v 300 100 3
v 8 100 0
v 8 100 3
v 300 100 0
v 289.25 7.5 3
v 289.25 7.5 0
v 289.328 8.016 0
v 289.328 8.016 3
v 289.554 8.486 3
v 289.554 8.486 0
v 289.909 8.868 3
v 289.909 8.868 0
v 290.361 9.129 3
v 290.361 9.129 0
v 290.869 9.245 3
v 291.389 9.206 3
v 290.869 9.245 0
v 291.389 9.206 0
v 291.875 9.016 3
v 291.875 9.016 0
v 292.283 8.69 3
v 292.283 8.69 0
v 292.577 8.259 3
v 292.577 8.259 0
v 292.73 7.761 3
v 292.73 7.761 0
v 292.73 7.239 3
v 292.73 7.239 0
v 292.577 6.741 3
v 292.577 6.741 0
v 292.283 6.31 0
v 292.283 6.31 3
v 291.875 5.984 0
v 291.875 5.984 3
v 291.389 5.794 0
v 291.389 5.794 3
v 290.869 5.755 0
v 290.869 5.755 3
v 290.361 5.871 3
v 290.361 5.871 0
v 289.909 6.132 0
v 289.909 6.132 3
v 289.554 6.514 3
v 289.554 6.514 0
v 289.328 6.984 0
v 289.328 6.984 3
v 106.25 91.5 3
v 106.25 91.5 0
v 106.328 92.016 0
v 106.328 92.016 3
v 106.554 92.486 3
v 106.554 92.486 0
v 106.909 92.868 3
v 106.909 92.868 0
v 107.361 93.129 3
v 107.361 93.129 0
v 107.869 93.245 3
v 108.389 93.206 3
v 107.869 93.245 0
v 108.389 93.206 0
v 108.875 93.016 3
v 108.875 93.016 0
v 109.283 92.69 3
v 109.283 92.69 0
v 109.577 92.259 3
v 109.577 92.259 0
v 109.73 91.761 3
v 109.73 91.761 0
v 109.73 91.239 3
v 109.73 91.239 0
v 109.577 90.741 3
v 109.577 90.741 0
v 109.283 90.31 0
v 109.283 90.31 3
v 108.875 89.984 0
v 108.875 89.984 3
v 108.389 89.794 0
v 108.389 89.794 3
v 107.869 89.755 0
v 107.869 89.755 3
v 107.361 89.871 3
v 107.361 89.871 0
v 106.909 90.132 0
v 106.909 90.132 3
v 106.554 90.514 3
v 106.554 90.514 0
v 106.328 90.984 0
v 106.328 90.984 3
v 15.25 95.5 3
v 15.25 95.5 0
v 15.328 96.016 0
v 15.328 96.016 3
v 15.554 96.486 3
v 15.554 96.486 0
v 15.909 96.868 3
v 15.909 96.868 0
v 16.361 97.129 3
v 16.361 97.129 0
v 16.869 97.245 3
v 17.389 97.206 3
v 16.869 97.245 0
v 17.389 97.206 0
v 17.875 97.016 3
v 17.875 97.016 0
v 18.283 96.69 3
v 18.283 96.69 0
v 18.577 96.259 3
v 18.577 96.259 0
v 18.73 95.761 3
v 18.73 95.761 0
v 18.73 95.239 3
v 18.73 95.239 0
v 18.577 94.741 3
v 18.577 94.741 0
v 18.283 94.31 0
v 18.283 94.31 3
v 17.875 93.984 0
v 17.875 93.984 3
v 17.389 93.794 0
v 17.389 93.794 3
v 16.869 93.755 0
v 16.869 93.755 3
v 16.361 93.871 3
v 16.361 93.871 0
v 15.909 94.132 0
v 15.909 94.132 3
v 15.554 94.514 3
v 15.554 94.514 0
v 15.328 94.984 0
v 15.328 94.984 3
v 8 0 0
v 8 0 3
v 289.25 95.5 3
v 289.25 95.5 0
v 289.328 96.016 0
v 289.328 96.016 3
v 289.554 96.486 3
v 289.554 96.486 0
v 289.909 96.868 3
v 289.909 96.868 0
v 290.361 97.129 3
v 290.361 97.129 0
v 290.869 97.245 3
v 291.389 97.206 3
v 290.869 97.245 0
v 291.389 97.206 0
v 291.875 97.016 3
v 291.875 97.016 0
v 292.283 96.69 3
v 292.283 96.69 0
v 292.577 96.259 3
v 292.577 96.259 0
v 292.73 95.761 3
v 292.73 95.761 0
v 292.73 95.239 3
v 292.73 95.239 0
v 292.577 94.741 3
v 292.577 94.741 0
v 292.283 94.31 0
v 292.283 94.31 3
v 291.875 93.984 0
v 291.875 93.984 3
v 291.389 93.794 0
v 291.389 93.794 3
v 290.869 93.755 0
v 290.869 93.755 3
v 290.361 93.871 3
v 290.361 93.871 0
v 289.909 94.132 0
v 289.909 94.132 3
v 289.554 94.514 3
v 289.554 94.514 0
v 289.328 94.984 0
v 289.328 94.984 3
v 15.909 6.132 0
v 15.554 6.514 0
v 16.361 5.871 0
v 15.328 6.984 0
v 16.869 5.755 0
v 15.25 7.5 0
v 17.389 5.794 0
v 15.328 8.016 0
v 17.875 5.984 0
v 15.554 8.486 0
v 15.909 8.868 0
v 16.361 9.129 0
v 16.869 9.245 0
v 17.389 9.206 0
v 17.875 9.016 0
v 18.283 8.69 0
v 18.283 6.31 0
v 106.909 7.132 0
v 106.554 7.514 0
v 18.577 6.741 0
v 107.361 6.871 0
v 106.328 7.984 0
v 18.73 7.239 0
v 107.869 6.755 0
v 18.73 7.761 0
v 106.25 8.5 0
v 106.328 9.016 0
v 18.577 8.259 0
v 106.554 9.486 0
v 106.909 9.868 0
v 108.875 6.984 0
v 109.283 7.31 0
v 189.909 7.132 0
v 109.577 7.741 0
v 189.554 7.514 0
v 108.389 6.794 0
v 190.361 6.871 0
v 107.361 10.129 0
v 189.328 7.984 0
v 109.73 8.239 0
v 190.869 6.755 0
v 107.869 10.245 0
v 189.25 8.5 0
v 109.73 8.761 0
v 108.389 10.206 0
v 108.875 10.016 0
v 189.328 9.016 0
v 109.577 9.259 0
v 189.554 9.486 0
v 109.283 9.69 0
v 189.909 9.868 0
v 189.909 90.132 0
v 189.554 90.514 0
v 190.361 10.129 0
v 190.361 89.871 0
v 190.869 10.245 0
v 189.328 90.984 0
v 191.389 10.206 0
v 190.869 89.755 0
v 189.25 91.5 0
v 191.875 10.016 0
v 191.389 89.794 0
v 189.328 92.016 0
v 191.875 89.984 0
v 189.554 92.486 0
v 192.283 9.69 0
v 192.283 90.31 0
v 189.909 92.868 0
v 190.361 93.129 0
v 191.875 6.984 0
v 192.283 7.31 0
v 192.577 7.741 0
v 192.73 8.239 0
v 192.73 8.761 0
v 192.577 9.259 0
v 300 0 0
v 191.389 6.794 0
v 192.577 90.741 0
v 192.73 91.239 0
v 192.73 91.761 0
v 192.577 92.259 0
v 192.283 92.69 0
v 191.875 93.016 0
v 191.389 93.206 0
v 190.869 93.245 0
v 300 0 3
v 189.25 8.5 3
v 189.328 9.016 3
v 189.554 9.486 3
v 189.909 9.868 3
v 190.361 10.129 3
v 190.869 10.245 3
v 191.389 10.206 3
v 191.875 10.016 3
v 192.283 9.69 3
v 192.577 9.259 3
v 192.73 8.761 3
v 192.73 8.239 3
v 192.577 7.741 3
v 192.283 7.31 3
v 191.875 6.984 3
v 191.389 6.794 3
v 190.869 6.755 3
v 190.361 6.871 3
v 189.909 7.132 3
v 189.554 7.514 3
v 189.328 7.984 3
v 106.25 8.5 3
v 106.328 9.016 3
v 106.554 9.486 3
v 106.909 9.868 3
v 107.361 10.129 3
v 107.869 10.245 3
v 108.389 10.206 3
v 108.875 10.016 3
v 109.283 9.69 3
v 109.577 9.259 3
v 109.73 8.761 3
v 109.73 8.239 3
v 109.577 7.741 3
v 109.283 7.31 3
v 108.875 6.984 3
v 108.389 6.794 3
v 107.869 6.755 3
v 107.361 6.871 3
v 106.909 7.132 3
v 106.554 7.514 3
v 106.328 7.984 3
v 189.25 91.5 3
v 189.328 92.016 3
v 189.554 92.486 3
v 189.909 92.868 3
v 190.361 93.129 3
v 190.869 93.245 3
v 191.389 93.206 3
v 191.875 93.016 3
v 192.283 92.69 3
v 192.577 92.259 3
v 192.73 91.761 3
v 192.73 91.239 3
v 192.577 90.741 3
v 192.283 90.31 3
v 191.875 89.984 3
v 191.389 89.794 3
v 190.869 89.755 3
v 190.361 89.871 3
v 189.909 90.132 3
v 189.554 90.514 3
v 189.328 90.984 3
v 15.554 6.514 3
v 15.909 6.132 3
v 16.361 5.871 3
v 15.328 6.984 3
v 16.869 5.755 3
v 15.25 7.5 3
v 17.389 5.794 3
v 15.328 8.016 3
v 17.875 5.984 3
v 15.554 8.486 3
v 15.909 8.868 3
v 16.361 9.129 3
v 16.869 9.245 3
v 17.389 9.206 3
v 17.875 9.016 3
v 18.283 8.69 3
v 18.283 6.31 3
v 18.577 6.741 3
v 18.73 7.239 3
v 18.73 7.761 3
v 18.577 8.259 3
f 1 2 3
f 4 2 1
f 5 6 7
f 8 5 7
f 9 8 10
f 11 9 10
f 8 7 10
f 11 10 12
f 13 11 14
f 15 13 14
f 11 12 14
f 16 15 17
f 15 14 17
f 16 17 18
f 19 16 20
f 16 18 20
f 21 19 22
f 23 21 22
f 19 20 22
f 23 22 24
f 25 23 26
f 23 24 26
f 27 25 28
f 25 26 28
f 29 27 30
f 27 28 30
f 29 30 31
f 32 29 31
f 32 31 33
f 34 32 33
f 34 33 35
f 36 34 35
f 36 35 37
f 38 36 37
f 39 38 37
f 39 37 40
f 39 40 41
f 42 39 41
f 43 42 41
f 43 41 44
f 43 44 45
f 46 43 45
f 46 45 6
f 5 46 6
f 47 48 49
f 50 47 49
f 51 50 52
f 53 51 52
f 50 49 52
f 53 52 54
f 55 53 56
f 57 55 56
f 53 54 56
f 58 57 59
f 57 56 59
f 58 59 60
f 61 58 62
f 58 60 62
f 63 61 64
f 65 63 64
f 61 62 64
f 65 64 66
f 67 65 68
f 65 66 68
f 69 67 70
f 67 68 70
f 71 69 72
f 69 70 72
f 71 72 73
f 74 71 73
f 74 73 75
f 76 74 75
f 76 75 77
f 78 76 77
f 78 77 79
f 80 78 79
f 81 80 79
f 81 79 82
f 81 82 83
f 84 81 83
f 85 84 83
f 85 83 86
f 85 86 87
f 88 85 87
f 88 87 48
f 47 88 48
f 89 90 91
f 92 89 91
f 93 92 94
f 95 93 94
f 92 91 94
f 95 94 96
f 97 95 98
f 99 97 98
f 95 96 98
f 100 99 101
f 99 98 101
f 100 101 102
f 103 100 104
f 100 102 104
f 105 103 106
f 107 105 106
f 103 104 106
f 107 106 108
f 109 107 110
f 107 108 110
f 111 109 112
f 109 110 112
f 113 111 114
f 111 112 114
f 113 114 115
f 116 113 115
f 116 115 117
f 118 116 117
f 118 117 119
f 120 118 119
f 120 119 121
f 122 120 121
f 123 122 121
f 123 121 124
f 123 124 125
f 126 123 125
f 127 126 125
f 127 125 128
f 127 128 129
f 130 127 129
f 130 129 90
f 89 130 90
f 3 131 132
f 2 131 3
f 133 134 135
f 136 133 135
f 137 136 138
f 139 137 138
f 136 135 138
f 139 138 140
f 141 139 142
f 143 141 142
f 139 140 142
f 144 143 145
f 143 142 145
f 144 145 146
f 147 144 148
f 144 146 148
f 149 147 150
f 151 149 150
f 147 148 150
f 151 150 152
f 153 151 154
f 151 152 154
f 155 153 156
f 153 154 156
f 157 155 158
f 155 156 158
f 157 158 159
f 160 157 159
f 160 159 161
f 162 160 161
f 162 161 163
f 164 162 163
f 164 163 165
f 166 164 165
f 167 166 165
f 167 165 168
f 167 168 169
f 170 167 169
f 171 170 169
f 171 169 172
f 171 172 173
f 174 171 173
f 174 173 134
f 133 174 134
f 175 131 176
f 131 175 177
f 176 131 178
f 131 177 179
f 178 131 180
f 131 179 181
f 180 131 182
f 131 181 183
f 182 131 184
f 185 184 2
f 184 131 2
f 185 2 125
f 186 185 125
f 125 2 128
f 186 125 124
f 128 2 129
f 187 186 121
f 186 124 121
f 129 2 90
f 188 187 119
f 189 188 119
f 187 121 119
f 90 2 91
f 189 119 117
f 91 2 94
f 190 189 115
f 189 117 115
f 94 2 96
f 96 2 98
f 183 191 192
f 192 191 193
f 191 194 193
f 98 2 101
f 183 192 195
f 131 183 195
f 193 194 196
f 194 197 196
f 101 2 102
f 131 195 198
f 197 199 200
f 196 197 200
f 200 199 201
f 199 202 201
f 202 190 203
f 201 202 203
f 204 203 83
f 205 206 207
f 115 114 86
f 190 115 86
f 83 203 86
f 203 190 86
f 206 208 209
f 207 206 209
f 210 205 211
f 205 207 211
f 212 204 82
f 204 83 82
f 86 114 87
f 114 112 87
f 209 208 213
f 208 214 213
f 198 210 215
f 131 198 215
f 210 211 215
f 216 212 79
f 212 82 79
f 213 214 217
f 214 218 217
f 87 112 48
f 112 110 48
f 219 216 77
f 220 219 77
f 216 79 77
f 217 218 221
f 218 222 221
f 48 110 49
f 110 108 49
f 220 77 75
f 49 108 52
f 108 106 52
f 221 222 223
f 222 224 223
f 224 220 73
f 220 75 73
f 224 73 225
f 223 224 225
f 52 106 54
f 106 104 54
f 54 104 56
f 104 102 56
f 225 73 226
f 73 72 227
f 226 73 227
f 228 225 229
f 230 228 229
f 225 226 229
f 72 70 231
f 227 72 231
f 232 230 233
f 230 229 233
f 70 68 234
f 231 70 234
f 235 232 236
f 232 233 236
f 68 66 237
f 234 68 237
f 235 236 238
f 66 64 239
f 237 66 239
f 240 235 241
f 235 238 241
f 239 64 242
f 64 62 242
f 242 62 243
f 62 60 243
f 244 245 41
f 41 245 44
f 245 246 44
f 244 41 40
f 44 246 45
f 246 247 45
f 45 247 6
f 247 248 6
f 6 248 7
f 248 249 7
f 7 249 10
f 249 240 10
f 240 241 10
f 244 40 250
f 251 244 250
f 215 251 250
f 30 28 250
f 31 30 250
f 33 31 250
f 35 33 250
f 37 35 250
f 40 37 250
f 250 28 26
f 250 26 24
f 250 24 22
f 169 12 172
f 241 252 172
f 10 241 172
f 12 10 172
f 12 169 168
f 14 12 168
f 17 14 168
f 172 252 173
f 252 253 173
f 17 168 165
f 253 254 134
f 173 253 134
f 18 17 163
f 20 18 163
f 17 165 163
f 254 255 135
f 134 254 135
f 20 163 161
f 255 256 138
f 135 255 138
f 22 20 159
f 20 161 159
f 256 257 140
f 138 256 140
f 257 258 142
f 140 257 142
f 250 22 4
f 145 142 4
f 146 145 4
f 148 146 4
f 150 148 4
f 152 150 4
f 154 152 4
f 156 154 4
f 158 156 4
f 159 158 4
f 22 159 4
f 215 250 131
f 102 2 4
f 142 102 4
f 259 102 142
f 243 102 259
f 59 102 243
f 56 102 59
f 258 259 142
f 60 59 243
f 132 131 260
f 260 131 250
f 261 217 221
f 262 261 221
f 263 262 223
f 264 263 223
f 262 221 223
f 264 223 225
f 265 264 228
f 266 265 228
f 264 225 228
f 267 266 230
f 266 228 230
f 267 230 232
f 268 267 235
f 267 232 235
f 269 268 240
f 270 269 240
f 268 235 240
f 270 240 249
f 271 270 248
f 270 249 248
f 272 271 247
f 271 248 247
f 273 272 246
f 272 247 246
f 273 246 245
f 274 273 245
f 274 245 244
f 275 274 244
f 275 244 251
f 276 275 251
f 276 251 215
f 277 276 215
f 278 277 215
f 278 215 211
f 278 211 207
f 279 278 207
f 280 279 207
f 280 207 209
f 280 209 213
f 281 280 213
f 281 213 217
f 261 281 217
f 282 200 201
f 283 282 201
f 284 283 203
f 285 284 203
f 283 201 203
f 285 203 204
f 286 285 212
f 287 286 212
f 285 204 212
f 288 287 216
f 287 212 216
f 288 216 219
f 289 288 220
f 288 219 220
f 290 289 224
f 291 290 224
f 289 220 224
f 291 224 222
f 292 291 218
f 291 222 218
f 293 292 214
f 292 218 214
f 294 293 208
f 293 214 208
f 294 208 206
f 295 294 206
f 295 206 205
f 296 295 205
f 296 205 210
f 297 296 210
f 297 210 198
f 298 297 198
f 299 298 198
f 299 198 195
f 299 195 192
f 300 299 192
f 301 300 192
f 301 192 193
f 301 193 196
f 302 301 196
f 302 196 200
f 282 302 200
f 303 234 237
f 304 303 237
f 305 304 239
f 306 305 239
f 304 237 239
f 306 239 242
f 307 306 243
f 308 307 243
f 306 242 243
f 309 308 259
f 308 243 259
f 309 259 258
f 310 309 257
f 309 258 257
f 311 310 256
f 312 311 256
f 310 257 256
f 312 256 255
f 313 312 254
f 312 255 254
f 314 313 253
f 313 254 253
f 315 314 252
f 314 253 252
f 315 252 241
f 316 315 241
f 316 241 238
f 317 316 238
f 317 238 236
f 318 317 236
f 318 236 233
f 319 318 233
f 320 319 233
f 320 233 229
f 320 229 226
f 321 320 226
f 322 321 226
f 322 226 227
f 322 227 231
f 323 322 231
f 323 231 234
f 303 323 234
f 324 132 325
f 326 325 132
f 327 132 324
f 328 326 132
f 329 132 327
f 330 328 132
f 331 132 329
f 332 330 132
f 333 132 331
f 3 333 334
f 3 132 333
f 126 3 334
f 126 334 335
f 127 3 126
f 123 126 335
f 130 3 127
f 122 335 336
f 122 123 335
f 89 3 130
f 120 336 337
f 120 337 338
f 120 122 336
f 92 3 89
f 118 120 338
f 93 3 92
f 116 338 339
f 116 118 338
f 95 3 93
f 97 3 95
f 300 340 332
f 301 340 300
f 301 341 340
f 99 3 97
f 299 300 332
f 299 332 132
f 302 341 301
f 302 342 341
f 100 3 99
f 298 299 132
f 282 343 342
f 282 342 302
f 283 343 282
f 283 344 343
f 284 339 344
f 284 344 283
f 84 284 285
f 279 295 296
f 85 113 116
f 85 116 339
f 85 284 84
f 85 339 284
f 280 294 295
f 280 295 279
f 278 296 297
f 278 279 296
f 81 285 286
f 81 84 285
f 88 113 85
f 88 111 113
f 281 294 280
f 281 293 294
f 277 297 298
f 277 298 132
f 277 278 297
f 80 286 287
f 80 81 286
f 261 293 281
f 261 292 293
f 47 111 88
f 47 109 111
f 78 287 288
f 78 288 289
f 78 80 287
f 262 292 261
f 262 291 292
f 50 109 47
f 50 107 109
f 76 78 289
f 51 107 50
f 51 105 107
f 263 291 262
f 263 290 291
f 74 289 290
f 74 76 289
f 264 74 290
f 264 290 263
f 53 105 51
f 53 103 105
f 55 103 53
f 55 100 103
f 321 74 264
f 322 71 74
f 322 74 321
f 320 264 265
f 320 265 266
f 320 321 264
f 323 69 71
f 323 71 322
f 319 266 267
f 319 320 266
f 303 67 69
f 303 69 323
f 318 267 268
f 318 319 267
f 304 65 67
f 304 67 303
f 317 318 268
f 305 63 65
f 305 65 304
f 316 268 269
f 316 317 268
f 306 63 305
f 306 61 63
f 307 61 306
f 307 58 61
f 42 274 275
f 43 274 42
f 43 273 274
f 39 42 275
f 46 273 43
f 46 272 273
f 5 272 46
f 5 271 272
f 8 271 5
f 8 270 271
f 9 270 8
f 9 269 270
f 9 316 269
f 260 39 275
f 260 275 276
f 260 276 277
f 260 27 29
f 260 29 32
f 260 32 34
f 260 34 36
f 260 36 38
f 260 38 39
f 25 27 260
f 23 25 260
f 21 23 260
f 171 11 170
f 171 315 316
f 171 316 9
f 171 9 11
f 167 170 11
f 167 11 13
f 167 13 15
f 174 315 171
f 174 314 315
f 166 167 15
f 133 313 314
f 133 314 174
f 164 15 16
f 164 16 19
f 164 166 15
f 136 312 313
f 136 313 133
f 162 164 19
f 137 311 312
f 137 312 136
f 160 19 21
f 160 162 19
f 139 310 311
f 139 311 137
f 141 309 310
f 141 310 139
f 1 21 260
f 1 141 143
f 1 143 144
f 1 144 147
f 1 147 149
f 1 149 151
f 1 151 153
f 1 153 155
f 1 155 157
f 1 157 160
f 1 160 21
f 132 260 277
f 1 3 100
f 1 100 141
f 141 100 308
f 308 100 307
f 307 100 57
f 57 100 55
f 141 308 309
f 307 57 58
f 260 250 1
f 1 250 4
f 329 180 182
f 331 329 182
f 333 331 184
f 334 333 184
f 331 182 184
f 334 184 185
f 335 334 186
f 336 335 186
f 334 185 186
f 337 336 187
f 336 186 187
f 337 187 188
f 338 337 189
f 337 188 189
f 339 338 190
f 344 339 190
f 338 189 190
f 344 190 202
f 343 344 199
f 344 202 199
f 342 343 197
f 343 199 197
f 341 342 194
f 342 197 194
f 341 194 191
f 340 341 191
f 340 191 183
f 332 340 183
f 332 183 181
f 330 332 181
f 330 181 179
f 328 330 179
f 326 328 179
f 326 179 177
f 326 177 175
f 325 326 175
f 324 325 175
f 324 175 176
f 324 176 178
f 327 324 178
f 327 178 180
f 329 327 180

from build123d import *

# Parameters (mm, degrees)
SKETCH1_W           = 300
SKETCH1_H           = 100
BOSS_EXTRUDE1_DEPTH = 3
SKETCH3_W           = 8
SKETCH3_H           = 100
CUT_EXTRUDE2_DEPTH  = 10
SKETCH4_R           = 1.75
CUT_EXTRUDE3_DEPTH  = 4
SKETCH7_R           = 1.75
CUT_EXTRUDE6_DEPTH  = 4


with BuildPart() as part:
    # Sketch1 → Boss-Extrude1 (new body)
    with BuildSketch(Plane.XY):
        with Locations((150, 50)):
            Rectangle(SKETCH1_W, SKETCH1_H)
    extrude(amount=BOSS_EXTRUDE1_DEPTH)

    # Sketch3 → Cut-Extrude2 (cut)
    with BuildSketch(Plane(origin=(0, 0, 0), x_dir=(-1, 0, 0), z_dir=(0, 0, -1))):
        with Locations((-4, 50)):
            Rectangle(SKETCH3_W, SKETCH3_H)
    extrude(amount=-CUT_EXTRUDE2_DEPTH, mode=Mode.SUBTRACT)

    # Sketch4 → Cut-Extrude3 (cut, through all)
    with BuildSketch(Plane(origin=(0, 0, 0), x_dir=(-1, 0, 0), z_dir=(0, 0, -1))):
        with Locations((-291, 95.5)):
            Circle(SKETCH4_R)
        with Locations((-17, 95.5)):
            Circle(SKETCH4_R)
        with Locations((-17, 7.5)):
            Circle(SKETCH4_R)
        with Locations((-291, 7.5)):
            Circle(SKETCH4_R)
    extrude(amount=-CUT_EXTRUDE3_DEPTH, mode=Mode.SUBTRACT)

    # Sketch7 → Cut-Extrude6 (cut, through all)
    with BuildSketch(Plane(origin=(0, 0, 0), x_dir=(-1, 0, 0), z_dir=(0, 0, -1))):
        with Locations((-108, 91.5)):
            Circle(SKETCH7_R)
        with Locations((-191, 91.5)):
            Circle(SKETCH7_R)
        with Locations((-191, 8.5)):
            Circle(SKETCH7_R)
        with Locations((-108, 8.5)):
            Circle(SKETCH7_R)
    extrude(amount=-CUT_EXTRUDE6_DEPTH, mode=Mode.SUBTRACT)


solid = part.part
